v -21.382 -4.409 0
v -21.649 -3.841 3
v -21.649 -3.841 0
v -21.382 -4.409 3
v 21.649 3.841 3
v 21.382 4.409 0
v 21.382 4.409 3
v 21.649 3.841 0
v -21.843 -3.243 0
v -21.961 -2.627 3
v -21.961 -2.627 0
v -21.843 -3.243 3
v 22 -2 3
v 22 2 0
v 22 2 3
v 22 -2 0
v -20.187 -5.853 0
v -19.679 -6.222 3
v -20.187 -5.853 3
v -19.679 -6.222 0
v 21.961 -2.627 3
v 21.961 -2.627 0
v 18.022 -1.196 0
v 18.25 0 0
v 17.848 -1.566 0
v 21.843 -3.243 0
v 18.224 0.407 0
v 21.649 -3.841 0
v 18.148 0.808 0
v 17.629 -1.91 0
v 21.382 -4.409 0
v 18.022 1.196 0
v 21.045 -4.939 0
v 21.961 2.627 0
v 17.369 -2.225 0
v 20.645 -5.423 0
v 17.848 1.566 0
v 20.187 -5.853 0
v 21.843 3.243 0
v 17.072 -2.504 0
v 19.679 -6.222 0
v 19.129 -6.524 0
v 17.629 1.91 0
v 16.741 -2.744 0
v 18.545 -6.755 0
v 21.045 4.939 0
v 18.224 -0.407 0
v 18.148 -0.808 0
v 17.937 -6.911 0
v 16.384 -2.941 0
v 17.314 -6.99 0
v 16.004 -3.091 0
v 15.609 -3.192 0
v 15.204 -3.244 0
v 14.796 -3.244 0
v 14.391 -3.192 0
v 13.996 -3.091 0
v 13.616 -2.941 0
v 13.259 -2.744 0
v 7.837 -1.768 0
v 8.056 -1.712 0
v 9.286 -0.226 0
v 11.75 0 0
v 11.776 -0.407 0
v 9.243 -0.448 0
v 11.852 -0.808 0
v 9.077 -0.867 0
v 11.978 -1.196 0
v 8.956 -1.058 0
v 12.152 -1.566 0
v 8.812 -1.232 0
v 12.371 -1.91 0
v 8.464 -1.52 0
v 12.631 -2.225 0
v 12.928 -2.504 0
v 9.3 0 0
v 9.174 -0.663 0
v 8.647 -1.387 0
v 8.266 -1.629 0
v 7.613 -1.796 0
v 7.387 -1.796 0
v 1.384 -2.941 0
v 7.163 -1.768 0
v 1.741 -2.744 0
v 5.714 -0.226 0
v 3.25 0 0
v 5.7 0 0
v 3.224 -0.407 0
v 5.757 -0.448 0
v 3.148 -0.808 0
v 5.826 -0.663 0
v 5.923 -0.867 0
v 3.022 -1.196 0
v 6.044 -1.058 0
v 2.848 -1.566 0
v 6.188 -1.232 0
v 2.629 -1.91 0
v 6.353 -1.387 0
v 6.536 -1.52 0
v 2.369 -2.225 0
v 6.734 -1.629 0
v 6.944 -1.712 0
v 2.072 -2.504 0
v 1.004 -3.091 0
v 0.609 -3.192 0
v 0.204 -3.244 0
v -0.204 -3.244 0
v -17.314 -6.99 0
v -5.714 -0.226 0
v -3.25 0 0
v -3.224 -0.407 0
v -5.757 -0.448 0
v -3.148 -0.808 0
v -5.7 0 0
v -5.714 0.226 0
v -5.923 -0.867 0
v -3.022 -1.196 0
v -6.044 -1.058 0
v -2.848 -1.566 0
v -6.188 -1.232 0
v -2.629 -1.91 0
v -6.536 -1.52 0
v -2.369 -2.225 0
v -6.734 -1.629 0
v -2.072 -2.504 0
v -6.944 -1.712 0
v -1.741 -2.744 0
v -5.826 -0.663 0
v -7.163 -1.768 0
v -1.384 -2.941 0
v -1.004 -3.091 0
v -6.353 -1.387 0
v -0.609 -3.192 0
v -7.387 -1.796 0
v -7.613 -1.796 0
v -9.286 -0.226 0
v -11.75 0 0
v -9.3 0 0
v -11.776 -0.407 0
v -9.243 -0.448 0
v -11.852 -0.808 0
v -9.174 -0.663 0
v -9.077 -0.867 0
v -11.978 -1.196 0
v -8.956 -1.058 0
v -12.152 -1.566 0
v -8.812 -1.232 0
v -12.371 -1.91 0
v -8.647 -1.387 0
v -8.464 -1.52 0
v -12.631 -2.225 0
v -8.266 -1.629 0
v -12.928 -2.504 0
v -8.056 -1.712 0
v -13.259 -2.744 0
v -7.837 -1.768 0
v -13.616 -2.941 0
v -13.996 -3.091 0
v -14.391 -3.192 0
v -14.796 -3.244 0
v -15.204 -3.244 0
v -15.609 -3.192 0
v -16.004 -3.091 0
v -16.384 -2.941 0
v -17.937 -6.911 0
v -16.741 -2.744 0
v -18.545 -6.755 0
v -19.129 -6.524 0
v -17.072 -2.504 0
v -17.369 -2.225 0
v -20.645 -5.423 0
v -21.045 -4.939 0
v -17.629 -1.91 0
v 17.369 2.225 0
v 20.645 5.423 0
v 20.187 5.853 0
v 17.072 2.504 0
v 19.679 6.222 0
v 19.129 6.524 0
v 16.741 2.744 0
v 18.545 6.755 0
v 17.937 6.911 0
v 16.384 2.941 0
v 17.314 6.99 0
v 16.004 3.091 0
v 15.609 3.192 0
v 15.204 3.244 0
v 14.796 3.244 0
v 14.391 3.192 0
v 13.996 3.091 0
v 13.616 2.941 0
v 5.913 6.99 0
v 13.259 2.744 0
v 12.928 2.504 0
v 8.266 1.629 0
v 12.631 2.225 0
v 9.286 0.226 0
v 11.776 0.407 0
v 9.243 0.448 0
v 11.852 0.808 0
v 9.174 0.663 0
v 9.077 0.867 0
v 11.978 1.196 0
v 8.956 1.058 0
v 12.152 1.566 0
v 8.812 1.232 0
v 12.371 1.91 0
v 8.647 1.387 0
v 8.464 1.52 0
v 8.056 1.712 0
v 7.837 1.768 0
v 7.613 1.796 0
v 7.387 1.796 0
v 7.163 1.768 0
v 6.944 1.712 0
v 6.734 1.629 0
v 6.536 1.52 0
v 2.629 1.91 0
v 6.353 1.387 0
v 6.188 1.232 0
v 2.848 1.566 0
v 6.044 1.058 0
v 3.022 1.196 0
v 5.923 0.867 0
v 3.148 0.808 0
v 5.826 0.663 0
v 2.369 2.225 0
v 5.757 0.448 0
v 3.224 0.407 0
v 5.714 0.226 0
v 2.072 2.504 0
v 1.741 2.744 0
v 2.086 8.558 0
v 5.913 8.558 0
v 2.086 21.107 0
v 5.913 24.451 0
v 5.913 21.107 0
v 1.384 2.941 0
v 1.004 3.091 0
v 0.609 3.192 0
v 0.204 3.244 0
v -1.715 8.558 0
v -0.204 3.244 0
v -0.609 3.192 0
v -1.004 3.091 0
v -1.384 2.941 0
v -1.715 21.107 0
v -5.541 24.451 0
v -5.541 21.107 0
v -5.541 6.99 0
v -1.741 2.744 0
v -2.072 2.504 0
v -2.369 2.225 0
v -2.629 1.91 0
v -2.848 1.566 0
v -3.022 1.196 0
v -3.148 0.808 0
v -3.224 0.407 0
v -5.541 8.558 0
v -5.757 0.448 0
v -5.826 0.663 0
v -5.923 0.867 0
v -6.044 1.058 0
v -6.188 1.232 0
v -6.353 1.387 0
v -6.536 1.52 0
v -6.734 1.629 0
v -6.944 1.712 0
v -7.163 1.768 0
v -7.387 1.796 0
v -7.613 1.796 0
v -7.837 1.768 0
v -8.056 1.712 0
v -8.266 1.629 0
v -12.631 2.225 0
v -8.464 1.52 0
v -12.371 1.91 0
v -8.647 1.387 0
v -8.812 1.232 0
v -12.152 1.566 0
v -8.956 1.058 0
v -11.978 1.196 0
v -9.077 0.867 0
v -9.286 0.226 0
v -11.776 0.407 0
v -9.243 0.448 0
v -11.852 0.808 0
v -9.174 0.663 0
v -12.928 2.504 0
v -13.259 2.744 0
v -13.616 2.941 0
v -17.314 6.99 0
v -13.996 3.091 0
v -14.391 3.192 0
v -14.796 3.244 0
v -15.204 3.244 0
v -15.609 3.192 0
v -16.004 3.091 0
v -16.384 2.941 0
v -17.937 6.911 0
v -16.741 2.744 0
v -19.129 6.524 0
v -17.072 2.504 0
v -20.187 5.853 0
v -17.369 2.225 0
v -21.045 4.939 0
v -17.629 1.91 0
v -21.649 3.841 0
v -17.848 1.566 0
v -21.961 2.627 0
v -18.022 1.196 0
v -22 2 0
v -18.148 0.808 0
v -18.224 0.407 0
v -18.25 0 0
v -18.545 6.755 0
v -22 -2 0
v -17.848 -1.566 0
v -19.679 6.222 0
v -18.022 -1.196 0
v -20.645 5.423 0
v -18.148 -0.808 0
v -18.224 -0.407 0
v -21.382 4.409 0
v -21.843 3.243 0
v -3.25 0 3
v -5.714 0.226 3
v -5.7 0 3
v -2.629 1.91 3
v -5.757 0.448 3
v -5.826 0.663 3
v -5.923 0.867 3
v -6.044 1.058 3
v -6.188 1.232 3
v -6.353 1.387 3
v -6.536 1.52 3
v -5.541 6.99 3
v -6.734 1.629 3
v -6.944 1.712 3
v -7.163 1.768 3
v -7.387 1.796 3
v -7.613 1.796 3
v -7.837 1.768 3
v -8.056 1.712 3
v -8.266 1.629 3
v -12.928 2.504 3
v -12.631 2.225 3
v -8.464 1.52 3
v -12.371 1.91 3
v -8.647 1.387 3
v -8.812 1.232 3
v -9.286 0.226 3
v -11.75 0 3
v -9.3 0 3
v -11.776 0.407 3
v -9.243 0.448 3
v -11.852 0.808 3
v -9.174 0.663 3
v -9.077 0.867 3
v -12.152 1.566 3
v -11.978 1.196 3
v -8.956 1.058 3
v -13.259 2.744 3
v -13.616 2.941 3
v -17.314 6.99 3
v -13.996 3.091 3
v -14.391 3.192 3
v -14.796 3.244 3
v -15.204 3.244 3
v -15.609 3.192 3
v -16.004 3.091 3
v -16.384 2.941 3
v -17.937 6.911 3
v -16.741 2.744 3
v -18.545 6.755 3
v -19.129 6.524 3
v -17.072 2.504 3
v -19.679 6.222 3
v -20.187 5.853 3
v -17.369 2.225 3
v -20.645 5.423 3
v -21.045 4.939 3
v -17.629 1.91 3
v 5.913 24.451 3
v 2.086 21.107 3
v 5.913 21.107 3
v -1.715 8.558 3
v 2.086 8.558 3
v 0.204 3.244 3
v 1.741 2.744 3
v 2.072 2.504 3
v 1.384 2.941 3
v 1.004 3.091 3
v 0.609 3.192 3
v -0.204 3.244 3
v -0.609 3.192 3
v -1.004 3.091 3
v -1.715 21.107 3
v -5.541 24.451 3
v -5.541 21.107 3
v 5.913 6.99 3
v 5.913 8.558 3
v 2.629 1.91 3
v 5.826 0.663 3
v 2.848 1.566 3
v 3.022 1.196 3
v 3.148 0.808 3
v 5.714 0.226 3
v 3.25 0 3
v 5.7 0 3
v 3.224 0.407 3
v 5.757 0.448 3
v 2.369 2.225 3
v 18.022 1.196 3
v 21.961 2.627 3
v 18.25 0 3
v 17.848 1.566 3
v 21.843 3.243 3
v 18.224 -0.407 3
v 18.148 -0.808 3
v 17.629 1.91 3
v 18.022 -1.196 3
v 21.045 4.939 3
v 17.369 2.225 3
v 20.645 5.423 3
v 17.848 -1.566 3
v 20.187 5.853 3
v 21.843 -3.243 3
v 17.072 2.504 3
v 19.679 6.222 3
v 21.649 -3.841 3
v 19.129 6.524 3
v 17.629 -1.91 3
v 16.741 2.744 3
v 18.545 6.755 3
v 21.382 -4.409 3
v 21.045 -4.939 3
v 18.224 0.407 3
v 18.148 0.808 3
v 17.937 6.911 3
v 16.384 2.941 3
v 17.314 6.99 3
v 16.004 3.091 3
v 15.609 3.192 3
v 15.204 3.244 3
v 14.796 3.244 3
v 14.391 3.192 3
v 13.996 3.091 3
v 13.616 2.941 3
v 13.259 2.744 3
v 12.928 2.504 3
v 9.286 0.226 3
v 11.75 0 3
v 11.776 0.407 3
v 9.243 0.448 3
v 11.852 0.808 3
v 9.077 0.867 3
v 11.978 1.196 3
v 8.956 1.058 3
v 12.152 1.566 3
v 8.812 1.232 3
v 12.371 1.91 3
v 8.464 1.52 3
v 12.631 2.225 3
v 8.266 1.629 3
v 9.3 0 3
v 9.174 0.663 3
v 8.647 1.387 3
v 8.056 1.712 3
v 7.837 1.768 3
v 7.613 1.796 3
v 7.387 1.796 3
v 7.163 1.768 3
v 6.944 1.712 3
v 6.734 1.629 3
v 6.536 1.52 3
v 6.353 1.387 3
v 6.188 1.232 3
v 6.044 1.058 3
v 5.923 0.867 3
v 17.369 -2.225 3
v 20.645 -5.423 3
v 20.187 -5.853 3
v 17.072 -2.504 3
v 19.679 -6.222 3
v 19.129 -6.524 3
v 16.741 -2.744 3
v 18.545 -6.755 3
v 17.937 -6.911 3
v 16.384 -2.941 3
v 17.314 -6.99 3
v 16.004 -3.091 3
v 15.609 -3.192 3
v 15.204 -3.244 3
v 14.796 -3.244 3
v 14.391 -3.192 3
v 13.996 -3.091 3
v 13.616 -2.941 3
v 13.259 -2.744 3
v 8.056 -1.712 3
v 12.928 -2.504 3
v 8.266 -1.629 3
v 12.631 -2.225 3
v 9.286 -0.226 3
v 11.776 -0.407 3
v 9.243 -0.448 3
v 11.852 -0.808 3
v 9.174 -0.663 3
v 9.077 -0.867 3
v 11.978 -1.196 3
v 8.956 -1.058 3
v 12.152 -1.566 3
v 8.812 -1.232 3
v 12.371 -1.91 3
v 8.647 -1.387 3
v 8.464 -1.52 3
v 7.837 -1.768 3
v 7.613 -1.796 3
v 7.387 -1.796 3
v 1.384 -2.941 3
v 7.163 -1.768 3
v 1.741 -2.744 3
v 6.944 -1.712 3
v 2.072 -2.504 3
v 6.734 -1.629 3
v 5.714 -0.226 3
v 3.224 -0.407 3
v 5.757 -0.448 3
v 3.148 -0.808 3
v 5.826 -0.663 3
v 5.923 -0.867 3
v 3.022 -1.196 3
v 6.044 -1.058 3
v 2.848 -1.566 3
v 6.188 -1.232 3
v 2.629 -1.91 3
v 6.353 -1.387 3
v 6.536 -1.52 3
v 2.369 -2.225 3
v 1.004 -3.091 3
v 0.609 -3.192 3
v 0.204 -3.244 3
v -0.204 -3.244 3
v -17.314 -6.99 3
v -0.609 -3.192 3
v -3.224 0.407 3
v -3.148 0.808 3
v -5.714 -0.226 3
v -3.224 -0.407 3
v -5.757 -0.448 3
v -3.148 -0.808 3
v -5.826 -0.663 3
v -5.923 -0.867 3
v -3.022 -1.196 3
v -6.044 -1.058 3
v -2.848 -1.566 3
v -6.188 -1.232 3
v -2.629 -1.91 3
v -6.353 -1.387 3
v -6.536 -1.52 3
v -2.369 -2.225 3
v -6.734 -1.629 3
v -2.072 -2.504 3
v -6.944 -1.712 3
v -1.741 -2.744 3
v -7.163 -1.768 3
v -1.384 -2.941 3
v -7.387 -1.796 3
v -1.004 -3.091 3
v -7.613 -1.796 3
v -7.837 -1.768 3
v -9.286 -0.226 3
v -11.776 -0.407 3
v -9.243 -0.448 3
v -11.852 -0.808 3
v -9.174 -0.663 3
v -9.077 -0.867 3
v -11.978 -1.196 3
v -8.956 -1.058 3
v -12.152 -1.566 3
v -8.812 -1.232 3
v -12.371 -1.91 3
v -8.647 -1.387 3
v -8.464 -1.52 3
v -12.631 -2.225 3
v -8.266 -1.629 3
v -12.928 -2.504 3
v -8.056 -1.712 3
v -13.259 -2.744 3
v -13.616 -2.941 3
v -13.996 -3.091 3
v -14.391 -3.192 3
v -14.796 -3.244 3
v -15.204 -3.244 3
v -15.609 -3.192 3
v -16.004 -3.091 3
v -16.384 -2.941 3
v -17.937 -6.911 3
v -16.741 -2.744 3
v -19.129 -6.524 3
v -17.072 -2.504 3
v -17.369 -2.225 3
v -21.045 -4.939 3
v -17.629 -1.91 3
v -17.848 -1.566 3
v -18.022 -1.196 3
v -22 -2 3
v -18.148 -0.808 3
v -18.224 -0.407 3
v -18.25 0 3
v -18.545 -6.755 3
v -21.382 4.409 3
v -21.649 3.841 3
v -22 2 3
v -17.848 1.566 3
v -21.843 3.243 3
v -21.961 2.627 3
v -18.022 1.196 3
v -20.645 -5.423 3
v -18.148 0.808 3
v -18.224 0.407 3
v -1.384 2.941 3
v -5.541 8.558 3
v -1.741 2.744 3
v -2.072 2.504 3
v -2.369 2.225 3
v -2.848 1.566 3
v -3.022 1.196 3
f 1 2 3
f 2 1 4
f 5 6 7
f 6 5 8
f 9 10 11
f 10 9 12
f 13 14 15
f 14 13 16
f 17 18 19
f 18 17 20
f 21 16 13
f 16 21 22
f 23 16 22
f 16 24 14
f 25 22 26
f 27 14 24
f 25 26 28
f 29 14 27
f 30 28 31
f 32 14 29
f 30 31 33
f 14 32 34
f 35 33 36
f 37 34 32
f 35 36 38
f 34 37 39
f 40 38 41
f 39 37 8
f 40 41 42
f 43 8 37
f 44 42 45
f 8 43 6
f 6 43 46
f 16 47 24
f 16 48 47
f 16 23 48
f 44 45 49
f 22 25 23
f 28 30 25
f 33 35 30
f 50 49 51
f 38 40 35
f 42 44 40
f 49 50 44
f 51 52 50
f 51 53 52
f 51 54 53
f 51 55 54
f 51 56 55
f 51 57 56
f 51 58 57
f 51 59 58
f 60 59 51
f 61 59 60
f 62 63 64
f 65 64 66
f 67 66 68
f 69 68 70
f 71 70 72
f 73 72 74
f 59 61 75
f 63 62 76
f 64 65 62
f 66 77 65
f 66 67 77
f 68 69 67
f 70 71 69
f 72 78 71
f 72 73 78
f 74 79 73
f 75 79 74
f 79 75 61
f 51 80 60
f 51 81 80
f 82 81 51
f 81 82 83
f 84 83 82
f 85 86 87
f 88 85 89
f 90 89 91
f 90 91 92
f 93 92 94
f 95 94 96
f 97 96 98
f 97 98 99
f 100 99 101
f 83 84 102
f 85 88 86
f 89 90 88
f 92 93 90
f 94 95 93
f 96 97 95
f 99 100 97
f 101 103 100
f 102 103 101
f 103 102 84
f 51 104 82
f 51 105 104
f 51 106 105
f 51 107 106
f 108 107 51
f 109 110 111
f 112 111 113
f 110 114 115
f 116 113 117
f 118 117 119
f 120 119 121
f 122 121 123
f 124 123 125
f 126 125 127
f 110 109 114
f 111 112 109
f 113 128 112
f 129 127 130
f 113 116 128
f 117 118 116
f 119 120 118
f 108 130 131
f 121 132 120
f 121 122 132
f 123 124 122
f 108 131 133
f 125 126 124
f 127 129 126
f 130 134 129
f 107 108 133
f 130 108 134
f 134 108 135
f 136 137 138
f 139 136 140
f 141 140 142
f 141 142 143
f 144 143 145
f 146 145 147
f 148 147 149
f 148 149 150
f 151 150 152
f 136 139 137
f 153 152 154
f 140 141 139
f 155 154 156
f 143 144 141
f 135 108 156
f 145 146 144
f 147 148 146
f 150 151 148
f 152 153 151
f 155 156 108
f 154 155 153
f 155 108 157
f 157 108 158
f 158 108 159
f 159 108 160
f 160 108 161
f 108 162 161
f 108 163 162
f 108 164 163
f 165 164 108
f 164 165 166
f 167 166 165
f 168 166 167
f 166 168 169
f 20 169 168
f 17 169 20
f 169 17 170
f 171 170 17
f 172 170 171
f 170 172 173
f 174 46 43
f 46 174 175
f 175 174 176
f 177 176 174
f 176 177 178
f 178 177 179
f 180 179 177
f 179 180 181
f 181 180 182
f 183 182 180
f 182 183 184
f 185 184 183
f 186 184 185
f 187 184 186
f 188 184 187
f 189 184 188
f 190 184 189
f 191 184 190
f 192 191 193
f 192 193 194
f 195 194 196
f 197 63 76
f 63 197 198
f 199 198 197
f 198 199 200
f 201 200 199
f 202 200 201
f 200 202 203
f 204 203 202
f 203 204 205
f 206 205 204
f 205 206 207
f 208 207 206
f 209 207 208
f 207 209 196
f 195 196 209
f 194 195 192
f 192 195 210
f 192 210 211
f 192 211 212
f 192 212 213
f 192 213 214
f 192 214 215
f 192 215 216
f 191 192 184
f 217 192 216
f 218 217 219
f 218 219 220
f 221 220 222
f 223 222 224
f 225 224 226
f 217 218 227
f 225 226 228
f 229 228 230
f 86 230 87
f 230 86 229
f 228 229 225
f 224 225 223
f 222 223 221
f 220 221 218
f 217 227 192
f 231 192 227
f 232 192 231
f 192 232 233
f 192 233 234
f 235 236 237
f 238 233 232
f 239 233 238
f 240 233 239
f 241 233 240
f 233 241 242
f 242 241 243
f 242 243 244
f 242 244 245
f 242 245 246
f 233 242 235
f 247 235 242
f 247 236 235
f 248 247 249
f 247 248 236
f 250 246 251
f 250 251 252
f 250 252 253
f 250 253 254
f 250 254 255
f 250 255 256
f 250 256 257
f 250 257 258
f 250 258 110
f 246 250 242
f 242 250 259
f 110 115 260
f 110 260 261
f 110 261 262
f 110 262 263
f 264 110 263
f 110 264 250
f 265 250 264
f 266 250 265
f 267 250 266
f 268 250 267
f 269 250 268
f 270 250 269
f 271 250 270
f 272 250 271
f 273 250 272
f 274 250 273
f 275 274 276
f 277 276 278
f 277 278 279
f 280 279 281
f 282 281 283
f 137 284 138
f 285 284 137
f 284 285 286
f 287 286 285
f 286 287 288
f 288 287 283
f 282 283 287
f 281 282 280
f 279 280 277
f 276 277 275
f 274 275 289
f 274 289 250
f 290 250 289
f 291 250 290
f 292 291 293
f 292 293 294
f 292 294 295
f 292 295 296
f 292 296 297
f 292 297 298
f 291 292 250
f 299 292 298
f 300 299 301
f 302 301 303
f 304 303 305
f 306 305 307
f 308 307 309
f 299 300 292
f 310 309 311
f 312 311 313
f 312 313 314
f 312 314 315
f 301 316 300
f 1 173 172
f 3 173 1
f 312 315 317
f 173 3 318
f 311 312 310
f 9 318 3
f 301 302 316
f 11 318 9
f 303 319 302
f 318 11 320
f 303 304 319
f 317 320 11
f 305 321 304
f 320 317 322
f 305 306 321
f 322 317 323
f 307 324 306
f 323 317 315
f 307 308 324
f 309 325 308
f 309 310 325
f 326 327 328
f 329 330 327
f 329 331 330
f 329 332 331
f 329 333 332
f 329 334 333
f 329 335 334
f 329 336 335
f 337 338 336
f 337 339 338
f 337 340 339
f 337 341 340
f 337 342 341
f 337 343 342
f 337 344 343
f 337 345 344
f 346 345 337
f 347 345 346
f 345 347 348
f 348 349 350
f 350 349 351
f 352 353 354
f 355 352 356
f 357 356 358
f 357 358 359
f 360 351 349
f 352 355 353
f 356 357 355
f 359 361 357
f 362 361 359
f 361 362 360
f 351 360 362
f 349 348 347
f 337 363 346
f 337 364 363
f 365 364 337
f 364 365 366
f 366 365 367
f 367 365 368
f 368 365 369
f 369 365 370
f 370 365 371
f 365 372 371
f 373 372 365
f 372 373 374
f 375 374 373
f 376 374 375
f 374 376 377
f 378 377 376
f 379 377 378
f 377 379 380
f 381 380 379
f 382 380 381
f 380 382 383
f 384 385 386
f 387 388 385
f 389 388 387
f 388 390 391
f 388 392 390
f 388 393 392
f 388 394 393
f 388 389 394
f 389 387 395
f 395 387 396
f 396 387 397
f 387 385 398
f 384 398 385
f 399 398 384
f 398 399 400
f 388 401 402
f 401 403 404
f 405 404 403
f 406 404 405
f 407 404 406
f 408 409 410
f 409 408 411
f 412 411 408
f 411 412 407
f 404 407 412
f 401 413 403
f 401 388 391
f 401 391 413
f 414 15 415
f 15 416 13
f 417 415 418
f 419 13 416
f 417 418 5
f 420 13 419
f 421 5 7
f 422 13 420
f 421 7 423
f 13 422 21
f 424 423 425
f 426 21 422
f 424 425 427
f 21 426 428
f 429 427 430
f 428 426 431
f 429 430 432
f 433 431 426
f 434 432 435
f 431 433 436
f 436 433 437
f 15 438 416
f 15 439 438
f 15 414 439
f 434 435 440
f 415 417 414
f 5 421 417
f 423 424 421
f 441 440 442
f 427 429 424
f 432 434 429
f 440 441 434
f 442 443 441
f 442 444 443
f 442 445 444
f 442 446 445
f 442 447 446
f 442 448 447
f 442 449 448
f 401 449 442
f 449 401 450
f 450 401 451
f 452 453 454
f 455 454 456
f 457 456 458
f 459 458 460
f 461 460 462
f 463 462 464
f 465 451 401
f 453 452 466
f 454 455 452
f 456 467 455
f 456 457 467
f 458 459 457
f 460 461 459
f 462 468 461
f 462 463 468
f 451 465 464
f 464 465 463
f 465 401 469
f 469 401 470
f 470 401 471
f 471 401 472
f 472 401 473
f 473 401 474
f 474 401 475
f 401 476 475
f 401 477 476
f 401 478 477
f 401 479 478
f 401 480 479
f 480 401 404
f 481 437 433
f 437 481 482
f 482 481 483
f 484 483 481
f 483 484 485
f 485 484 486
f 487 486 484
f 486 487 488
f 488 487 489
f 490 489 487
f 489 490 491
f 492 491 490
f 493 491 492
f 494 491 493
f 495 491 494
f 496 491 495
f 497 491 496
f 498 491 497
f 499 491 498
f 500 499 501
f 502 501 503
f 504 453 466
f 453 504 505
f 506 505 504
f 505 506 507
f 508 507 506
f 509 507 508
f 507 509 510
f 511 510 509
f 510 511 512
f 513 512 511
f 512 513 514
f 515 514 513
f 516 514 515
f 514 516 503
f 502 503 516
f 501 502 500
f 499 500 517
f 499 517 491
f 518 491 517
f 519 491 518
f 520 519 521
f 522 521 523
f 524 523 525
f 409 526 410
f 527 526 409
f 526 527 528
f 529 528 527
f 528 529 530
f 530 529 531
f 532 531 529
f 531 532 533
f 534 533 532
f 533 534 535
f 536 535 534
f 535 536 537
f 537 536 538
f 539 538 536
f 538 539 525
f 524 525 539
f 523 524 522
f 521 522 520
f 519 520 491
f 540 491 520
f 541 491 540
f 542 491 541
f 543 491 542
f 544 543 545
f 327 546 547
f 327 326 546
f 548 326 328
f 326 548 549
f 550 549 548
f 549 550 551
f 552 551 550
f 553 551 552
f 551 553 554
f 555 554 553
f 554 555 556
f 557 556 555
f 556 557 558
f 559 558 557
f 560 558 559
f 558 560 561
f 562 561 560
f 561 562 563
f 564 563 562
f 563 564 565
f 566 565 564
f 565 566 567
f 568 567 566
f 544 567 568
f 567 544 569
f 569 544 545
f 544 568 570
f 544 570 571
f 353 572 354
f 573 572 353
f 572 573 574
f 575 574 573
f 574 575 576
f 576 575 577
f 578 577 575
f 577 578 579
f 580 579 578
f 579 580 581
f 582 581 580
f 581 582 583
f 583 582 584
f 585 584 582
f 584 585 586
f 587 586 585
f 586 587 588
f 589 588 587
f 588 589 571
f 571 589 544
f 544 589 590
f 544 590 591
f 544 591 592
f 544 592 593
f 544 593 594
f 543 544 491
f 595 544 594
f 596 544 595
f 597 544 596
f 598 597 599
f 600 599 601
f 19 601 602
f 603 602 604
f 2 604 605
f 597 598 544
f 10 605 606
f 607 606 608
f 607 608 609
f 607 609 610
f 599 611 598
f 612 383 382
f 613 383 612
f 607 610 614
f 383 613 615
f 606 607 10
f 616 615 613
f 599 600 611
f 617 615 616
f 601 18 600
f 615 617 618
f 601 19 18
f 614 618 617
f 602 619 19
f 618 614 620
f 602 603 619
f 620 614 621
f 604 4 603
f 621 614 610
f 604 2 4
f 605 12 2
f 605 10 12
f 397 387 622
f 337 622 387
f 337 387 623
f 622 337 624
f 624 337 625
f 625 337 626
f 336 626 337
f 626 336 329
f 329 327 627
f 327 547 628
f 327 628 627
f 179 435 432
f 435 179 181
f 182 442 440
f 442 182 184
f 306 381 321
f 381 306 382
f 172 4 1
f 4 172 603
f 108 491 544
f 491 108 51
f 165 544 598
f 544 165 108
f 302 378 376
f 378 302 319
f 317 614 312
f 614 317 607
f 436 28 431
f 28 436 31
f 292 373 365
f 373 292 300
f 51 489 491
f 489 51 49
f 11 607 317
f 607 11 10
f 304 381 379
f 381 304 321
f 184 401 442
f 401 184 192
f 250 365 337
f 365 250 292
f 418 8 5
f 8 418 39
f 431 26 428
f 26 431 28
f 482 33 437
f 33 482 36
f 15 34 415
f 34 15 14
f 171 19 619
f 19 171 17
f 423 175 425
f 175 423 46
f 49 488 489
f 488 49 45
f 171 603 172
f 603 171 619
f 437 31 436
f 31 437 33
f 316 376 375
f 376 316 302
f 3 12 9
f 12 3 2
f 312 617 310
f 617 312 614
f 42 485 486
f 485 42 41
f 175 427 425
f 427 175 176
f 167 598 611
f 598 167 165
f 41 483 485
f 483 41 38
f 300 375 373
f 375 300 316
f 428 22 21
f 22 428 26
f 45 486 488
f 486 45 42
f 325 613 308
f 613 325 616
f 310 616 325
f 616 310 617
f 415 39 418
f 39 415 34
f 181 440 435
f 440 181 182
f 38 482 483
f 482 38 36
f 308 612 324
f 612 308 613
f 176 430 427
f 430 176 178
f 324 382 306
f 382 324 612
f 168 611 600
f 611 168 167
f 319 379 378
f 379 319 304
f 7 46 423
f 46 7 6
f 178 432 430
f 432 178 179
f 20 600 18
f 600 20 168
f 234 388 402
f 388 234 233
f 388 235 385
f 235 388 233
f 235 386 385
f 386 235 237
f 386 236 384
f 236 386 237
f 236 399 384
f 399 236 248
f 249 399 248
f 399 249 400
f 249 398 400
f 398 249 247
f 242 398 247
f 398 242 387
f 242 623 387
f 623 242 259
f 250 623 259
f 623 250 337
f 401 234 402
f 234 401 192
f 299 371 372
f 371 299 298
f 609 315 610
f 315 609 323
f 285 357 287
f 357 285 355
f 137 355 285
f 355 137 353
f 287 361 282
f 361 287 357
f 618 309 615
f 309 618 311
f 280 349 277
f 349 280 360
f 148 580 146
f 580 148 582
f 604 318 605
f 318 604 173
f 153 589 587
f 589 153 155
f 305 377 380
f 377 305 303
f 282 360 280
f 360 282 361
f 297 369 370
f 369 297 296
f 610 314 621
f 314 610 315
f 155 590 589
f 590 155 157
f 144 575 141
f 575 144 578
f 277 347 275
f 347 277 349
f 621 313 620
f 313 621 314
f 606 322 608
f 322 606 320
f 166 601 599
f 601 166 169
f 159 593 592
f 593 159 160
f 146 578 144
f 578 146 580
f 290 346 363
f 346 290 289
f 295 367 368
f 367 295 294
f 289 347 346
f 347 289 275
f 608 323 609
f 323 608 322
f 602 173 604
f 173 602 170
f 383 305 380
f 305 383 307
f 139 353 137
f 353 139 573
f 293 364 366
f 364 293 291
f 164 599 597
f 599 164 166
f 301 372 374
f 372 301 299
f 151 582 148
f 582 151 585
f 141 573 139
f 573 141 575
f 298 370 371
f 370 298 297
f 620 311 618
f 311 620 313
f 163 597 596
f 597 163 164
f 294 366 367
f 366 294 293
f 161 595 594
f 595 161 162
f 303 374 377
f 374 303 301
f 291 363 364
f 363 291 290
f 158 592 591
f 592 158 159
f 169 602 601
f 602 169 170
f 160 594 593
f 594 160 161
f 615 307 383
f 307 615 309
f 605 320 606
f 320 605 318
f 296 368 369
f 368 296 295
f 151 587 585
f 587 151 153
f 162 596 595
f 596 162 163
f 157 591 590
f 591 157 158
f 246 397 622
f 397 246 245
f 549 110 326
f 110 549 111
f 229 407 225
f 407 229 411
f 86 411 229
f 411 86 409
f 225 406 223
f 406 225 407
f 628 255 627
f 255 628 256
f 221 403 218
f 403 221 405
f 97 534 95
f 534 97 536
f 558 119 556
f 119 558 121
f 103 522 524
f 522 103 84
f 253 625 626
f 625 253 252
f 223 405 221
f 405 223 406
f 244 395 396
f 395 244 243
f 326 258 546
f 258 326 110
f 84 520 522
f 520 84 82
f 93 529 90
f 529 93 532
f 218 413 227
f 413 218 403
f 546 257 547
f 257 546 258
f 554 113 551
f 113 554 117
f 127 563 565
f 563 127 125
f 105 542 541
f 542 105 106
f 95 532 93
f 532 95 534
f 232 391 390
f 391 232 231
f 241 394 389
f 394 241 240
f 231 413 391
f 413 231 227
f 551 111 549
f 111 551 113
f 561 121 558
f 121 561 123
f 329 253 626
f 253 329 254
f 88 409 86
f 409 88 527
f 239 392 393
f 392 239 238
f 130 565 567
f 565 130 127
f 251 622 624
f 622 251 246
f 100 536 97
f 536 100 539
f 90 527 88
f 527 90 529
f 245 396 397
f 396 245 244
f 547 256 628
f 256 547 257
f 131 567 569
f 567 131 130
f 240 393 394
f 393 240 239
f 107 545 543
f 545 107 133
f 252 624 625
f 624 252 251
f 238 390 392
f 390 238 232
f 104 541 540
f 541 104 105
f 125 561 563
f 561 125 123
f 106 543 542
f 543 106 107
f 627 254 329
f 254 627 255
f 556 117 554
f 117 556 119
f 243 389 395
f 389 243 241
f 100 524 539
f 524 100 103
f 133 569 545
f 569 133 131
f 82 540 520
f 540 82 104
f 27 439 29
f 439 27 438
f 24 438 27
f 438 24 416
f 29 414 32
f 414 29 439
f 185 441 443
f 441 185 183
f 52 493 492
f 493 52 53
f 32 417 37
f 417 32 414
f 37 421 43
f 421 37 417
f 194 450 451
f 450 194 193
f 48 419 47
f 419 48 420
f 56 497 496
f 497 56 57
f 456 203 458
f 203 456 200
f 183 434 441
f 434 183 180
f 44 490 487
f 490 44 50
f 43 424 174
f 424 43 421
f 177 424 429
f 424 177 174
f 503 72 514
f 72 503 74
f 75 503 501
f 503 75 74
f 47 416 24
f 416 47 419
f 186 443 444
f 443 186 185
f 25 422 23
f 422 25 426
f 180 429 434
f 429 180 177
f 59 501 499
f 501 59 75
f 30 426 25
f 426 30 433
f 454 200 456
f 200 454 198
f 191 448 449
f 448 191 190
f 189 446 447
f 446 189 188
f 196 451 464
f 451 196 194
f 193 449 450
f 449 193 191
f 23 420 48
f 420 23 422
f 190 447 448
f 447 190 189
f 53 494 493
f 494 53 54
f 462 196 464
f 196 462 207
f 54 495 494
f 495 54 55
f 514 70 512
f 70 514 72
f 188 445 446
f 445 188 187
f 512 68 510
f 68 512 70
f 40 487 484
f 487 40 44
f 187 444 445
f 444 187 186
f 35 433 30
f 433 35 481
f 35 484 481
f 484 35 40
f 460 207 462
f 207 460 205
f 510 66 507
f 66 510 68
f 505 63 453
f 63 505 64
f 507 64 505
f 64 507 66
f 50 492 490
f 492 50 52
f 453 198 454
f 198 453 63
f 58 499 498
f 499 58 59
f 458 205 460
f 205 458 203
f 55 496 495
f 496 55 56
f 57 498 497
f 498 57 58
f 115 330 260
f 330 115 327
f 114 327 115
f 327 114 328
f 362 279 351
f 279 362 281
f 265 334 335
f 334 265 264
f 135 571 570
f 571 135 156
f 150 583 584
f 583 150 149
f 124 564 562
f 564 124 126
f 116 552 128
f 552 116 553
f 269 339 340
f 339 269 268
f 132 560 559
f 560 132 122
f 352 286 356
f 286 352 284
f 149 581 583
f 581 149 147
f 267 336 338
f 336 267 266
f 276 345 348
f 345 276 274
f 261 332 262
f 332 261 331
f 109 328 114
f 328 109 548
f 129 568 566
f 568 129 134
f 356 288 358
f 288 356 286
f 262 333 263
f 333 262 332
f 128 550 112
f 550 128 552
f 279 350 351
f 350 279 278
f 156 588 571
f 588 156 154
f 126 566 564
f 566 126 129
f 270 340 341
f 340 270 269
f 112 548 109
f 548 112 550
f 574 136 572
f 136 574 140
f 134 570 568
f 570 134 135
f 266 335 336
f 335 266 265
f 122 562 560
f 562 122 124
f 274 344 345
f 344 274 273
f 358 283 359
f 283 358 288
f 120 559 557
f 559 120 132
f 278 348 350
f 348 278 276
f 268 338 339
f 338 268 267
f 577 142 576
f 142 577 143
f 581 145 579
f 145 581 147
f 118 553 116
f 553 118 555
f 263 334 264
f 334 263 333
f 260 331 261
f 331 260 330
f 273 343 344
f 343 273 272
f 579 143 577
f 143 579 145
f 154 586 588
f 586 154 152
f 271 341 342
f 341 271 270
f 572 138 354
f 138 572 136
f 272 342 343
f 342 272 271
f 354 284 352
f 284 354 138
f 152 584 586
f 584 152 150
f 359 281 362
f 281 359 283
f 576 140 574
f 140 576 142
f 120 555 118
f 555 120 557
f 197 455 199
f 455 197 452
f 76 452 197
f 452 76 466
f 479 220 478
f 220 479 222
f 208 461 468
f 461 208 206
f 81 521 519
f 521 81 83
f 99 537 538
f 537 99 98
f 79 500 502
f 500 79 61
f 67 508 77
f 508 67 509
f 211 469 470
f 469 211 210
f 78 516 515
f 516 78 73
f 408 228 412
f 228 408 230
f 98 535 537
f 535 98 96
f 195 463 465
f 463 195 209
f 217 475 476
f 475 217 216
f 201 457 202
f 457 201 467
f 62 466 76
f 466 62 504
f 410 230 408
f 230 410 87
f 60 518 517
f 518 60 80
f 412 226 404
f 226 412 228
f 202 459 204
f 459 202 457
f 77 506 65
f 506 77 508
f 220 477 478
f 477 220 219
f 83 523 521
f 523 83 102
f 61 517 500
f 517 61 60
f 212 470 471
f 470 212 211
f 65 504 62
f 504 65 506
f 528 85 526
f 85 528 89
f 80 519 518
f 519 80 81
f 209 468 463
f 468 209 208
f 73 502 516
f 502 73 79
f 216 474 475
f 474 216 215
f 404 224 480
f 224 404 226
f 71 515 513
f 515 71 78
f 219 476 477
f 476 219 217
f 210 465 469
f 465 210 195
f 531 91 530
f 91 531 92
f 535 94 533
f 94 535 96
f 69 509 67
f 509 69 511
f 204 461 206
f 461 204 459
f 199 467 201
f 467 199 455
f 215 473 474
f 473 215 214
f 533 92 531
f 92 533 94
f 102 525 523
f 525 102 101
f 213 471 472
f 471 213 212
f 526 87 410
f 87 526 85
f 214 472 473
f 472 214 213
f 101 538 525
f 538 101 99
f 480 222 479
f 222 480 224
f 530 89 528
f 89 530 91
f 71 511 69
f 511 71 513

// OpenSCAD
$fn = 50;


difference() {
	union() {
		hull() {
			translate(v = [-17.0000000000, 2.0000000000, 0]) {
				cylinder(h = 3, r = 5);
			}
			translate(v = [17.0000000000, 2.0000000000, 0]) {
				cylinder(h = 3, r = 5);
			}
			translate(v = [-17.0000000000, -2.0000000000, 0]) {
				cylinder(h = 3, r = 5);
			}
			translate(v = [17.0000000000, -2.0000000000, 0]) {
				cylinder(h = 3, r = 5);
			}
		}
		translate(v = [0, 24, 0]) {
			linear_extrude(height = 3) {
				text(font = "DejaVu Sans Mono:style=Bold", halign = "center", size = 19.0000000000, text = "I", valign = "top");
			}
		}
	}
	union() {
		translate(v = [-15.0000000000, 0.0000000000, 0]) {
			translate(v = [0, 0, -100]) {
				cylinder(h = 200, r = 3.2500000000);
			}
		}
		translate(v = [0, 0, -100]) {
			cylinder(h = 200, r = 3.2500000000);
		}
		translate(v = [15.0000000000, 0.0000000000, 0]) {
			translate(v = [0, 0, -100]) {
				cylinder(h = 200, r = 3.2500000000);
			}
		}
		translate(v = [-15.0000000000, 0.0000000000, 0]) {
			translate(v = [0, 0, -100]) {
				cylinder(h = 200, r = 1.8000000000);
			}
		}
		translate(v = [-7.5000000000, 0.0000000000, 0]) {
			translate(v = [0, 0, -100]) {
				cylinder(h = 200, r = 1.8000000000);
			}
		}
		translate(v = [0, 0, -100]) {
			cylinder(h = 200, r = 1.8000000000);
		}
		translate(v = [7.5000000000, 0.0000000000, 0]) {
			translate(v = [0, 0, -100]) {
				cylinder(h = 200, r = 1.8000000000);
			}
		}
		translate(v = [15.0000000000, 0.0000000000, 0]) {
			translate(v = [0, 0, -100]) {
				cylinder(h = 200, r = 1.8000000000);
			}
		}
	}
}
